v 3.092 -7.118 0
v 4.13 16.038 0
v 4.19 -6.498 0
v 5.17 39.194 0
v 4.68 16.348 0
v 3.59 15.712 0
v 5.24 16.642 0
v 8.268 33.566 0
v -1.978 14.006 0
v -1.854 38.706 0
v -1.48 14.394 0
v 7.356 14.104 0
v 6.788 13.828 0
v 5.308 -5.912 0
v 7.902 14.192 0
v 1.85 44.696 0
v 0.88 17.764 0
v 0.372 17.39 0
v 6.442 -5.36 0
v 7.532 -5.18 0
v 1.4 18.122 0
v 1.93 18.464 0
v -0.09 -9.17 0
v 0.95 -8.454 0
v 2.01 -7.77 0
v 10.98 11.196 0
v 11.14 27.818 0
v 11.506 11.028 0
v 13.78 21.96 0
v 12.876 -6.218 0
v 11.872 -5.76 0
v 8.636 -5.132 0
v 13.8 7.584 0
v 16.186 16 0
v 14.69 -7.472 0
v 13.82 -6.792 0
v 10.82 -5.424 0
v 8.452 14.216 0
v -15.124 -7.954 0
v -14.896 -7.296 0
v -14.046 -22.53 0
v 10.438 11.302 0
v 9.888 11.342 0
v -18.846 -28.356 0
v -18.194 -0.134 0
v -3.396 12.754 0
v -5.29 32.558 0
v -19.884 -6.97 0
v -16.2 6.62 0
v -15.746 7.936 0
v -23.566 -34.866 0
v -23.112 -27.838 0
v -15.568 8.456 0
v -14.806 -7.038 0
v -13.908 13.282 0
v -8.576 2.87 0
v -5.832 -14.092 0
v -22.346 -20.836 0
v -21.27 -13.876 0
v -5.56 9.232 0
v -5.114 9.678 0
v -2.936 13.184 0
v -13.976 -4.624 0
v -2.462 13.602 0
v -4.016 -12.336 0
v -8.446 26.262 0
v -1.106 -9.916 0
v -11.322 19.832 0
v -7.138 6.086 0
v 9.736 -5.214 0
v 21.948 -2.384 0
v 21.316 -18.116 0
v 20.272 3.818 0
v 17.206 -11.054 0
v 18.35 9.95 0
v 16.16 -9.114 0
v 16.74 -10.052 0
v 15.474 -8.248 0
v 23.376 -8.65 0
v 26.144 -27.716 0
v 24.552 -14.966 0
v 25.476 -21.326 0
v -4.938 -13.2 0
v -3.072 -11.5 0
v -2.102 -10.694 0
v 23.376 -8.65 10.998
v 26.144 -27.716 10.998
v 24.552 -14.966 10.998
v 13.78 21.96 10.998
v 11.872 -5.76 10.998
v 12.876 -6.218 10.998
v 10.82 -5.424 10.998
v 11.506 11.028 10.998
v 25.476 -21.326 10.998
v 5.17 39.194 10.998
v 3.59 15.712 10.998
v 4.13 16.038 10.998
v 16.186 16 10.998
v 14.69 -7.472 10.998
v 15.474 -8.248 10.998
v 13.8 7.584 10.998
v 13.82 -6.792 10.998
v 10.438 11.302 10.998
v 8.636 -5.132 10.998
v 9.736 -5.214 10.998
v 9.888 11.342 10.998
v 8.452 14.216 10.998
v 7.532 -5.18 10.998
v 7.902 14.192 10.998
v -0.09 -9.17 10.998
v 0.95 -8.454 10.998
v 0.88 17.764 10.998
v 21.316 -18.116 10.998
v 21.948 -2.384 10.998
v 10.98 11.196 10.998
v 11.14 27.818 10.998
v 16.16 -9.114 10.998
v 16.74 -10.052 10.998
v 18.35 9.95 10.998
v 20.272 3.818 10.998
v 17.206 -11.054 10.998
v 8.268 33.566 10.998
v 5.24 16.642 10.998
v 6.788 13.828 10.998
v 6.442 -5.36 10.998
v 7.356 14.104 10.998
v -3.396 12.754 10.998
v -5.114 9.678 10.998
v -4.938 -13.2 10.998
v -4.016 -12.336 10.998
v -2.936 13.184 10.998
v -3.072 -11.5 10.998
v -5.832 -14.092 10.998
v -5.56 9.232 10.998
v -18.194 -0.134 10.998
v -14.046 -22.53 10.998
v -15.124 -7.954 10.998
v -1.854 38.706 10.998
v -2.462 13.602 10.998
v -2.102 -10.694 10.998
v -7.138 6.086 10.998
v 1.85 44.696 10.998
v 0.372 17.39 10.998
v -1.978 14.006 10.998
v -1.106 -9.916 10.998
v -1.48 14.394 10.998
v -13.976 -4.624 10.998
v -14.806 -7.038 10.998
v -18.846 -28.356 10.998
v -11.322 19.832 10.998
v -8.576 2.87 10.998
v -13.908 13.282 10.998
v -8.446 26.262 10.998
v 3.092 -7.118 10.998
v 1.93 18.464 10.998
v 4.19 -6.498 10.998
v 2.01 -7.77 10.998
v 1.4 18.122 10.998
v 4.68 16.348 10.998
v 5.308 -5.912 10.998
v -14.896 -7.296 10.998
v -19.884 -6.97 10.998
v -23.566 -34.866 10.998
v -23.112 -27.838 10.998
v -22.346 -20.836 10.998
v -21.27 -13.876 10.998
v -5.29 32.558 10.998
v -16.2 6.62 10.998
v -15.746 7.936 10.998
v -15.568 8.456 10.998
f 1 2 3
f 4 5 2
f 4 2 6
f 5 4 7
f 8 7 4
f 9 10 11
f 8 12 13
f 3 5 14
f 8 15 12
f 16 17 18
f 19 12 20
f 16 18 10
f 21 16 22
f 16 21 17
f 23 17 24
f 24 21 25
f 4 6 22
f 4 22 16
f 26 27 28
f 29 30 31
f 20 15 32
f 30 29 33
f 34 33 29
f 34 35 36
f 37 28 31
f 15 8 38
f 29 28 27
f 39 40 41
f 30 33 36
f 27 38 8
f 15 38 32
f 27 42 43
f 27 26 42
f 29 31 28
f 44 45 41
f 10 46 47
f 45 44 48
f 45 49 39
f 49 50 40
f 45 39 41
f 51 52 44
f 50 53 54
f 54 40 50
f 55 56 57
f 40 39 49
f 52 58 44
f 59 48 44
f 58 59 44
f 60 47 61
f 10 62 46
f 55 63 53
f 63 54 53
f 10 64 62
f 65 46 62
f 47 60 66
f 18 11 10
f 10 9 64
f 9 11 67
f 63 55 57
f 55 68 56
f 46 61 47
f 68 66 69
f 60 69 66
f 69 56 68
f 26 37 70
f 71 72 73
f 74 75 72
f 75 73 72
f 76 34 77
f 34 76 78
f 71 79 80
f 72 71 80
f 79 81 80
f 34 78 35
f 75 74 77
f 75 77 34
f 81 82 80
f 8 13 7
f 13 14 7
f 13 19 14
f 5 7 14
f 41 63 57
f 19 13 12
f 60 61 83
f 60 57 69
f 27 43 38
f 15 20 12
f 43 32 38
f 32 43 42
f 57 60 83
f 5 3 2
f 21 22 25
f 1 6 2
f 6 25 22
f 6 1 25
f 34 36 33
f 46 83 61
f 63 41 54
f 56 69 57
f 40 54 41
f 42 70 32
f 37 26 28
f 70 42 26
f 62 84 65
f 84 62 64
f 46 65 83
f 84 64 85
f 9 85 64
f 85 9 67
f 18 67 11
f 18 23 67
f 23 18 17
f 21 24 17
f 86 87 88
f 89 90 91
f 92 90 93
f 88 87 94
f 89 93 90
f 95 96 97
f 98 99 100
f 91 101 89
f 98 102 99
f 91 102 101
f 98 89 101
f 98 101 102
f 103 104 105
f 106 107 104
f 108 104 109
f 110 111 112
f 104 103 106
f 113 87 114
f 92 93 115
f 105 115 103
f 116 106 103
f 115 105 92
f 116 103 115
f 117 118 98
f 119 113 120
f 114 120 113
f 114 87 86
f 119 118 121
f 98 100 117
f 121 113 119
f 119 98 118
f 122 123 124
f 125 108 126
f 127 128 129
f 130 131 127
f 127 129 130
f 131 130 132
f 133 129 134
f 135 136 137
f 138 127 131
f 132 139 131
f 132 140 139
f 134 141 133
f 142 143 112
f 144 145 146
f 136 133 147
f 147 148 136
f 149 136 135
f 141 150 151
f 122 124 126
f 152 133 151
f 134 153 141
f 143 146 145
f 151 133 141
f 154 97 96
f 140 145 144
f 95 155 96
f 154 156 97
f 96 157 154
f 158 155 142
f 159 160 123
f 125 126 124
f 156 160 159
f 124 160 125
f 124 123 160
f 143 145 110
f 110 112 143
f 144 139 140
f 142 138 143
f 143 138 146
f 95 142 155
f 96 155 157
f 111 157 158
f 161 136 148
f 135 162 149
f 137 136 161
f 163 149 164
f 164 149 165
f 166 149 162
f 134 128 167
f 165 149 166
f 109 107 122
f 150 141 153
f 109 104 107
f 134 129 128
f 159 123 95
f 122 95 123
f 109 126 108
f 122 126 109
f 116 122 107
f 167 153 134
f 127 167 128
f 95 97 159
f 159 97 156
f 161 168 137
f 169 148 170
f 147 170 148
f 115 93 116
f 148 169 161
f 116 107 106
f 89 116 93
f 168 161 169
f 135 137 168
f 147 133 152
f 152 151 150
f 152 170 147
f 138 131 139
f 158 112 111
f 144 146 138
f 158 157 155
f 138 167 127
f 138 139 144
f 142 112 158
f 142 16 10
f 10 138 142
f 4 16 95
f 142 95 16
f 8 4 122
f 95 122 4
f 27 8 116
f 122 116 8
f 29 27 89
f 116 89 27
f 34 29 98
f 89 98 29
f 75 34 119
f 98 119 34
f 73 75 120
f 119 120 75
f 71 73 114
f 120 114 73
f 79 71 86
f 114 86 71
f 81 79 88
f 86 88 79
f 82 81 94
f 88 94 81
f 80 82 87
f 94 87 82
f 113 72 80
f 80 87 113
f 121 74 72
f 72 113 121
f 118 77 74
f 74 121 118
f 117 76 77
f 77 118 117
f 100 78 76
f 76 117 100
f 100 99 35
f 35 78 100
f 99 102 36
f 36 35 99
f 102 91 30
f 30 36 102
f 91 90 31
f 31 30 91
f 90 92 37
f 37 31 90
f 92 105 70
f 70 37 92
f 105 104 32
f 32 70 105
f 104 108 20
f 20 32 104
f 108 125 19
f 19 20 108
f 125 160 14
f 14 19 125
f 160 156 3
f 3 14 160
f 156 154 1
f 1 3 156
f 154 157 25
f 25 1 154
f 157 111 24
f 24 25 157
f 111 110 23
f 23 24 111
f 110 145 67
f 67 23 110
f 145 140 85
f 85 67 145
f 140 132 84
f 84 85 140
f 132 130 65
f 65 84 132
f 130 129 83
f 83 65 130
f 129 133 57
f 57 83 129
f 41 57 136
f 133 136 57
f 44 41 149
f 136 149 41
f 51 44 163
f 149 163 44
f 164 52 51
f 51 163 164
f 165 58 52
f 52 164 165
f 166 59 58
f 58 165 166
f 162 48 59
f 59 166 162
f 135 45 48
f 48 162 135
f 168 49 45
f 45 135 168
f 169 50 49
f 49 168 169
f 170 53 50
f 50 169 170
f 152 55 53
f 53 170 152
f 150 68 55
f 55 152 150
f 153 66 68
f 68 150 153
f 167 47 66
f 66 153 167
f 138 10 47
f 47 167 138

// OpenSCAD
//
//    Usage:
//
//        To reference this file in another OpenSCAD file
//            use <star-trek-logo.scad>;

/////////////////////
// MODULE Star_Trek_Logo_Blank_fixed
/////////////////////

// Examples/Tests
Star_Trek_Logo_Blank_fixed();

// Functions and Utilities
function Star_Trek_Logo_Blank_fixed_dimX() = 49.71;
function Star_Trek_Logo_Blank_fixed_dimY() = 79.56;
function Star_Trek_Logo_Blank_fixed_dimZ() = 11.00;
function Star_Trek_Logo_Blank_fixed_multmatrix() = [[1.000000,0.000000,0.000000,0.000000],[0.000000,1.000000,0.000000,0.000000],[0.000000,0.000000,1.000000,0.000000],[0.000000,0.000000,0.000000,1.000000]];

/////////////////////
// geometry for Star_Trek_Logo_Blank_fixed
function Star_Trek_Logo_Blank_fixed_faces() = [
[2,1,0],[1,4,3],[5,1,3],[6,3,4],[3,6,7],[10,9,8],[12,11,7],[13,4,2],[11,14,7],[17,16,15],[19,11,18],[9,17,15],[21,15,20],[16,20,15],[23,16,22],[24,20,23],[21,5,3],[15,21,3],[27,26,25],[30,29,28],[31,14,19],[32,28,29],[28,32,33],[35,34,33],[30,27,36],[37,7,14],[26,27,28],[40,39,38],[35,32,29],[7,37,26],[31,37,14],[42,41,26],[41,25,26],[27,30,28],[40,44,43],[46,45,9],[47,43,44],[38,48,44],[39,49,48],[40,38,44],[43,51,50],[53,52,49],[49,39,53],[56,55,54],[48,38,39],[43,57,51],[43,47,58],[43,58,57],[60,46,59],[45,61,9],[52,62,54],[52,53,62],[61,63,9],[61,45,64],[65,59,46],[9,10,17],[63,8,9],[66,10,8],[56,54,62],[55,67,54],[46,60,45],[68,65,67],[65,68,59],[67,55,68],[69,36,25],[72,71,70],[71,74,73],[71,72,74],[76,33,75],[77,75,33],[79,78,70],[79,70,71],[79,80,78],[34,77,33],[76,73,74],[33,76,74],[79,81,80],[6,12,7],[6,13,12],[13,18,12],[13,6,4],[56,62,40],[11,12,18],[82,60,59],[68,56,59],[37,42,26],[11,19,14],[37,31,42],[41,42,31],[82,59,56],[1,2,4],[24,21,20],[1,5,0],[21,24,5],[24,0,5],[32,35,33],[60,82,45],[53,40,62],[56,68,55],[40,53,39],[31,69,41],[27,25,36],[25,41,69],[64,83,61],[63,61,83],[82,64,45],[84,63,83],[63,84,8],[66,8,84],[10,66,17],[66,22,17],[16,17,22],[16,23,20],[87,86,85],[90,89,88],[92,89,91],[93,86,87],[89,92,88],[96,95,94],[99,98,97],[88,100,90],[98,101,97],[100,101,90],[100,88,97],[101,100,97],[104,103,102],[103,106,105],[108,103,107],[111,110,109],[105,102,103],[113,86,112],[114,92,91],[102,114,104],[102,105,115],[91,104,114],[114,102,115],[97,117,116],[119,112,118],[112,119,113],[85,86,113],[120,117,118],[116,99,97],[118,112,120],[117,97,118],[123,122,121],[125,107,124],[128,127,126],[126,130,129],[129,128,126],[131,129,130],[133,128,132],[136,135,134],[130,126,137],[130,138,131],[138,139,131],[132,140,133],[111,142,141],[145,144,143],[146,132,135],[135,147,146],[134,135,148],[150,149,140],[125,123,121],[150,132,151],[140,152,133],[144,145,142],[140,132,150],[95,96,153],[143,144,139],[95,154,94],[96,155,153],[153,156,95],[141,154,157],[122,159,158],[123,125,124],[158,159,155],[124,159,123],[159,122,123],[109,144,142],[142,111,109],[139,138,143],[142,137,141],[145,137,142],[154,141,94],[156,154,95],[157,156,110],[147,135,160],[148,161,134],[160,135,136],[163,148,162],[164,148,163],[161,148,165],[166,127,133],[165,148,164],[121,106,108],[152,140,149],[106,103,108],[127,128,133],[94,122,158],[122,94,121],[107,125,108],[108,125,121],[106,121,115],[133,152,166],[127,166,126],[158,96,94],[155,96,158],[136,167,160],[169,147,168],[147,169,146],[115,92,114],[160,168,147],[105,106,115],[92,115,88],[168,160,167],[167,136,134],[151,132,146],[149,150,151],[146,169,151],[138,130,137],[110,111,157],[137,145,143],[154,156,157],[126,166,137],[143,138,137],[157,111,141],[9,15,141],[141,137,9],[94,15,3],[15,94,141],[121,3,7],[3,121,94],[115,7,26],[7,115,121],[88,26,28],[26,88,115],[97,28,33],[28,97,88],[118,33,74],[33,118,97],[119,74,72],[74,119,118],[113,72,70],[72,113,119],[85,70,78],[70,85,113],[87,78,80],[78,87,85],[93,80,81],[80,93,87],[86,81,79],[81,86,93],[79,71,112],[112,86,79],[71,73,120],[120,112,71],[73,76,117],[117,120,73],[76,75,116],[116,117,76],[75,77,99],[99,116,75],[34,98,99],[99,77,34],[35,101,98],[98,34,35],[29,90,101],[101,35,29],[30,89,90],[90,29,30],[36,91,89],[89,30,36],[69,104,91],[91,36,69],[31,103,104],[104,69,31],[19,107,103],[103,31,19],[18,124,107],[107,19,18],[13,159,124],[124,18,13],[2,155,159],[159,13,2],[0,153,155],[155,2,0],[24,156,153],[153,0,24],[23,110,156],[156,24,23],[22,109,110],[110,23,22],[66,144,109],[109,22,66],[84,139,144],[144,66,84],[83,131,139],[139,84,83],[64,129,131],[131,83,64],[82,128,129],[129,64,82],[56,132,128],[128,82,56],[135,56,40],[56,135,132],[148,40,43],[40,148,135],[162,43,50],[43,162,148],[50,51,163],[163,162,50],[51,57,164],[164,163,51],[57,58,165],[165,164,57],[58,47,161],[161,165,58],[47,44,134],[134,161,47],[44,48,167],[167,134,44],[48,49,168],[168,167,48],[49,52,169],[169,168,49],[52,54,151],[151,169,52],[54,67,149],[149,151,54],[67,65,152],[152,149,67],[65,46,166],[166,152,65],[46,9,137],[137,166,46]];
function Star_Trek_Logo_Blank_fixed_points() = [
[73.092003,82.882004,0.000000],[74.130005,106.038002,0.000000],[74.190002,83.502007,0.000000],[75.170006,129.194000,0.000000],[74.680000,106.348007,0.000000],[73.590004,105.712006,0.000000],[75.240005,106.642006,0.000000],[78.268005,123.566010,0.000000],[68.022003,104.006004,0.000000],[68.146004,128.706009,0.000000],[68.520004,104.394005,0.000000],[77.356003,104.104004,0.000000],[76.788002,103.828003,0.000000],[75.308006,84.088005,0.000000],[77.902000,104.192001,0.000000],[71.850006,134.695999,0.000000],[70.880005,107.764008,0.000000],[70.372002,107.390007,0.000000],[76.442001,84.640007,0.000000],[77.532005,84.820007,0.000000],[71.400002,108.122002,0.000000],[71.930000,108.464005,0.000000],[69.910004,80.830002,0.000000],[70.950005,81.546005,0.000000],[72.010002,82.230003,0.000000],[80.980003,101.196007,0.000000],[81.140007,117.818008,0.000000],[81.506004,101.028008,0.000000],[83.780006,111.960007,0.000000],[82.876007,83.782005,0.000000],[81.872002,84.240005,0.000000],[78.636002,84.868004,0.000000],[83.800003,97.584007,0.000000],[86.186005,106.000008,0.000000],[84.690002,82.528008,0.000000],[83.820007,83.208000,0.000000],[80.820007,84.576004,0.000000],[78.452003,104.216003,0.000000],[54.876003,82.046005,0.000000],[55.104004,82.704002,0.000000],[55.954002,67.470001,0.000000],[80.438004,101.302002,0.000000],[79.888000,101.342003,0.000000],[51.154003,61.644005,0.000000],[51.806004,89.866005,0.000000],[66.604004,102.754005,0.000000],[64.710007,122.558006,0.000000],[50.116001,83.030006,0.000000],[53.800003,96.620003,0.000000],[54.254002,97.936005,0.000000],[46.434002,55.134003,0.000000],[46.888000,62.162003,0.000000],[54.432003,98.456001,0.000000],[55.194004,82.962006,0.000000],[56.092003,103.282005,0.000000],[61.424004,92.870003,0.000000],[64.167999,75.908005,0.000000],[47.654003,69.164001,0.000000],[48.730003,76.124001,0.000000],[64.440002,99.232002,0.000000],[64.886002,99.678001,0.000000],[67.064003,103.184006,0.000000],[56.024002,85.376007,0.000000],[67.538002,103.602005,0.000000],[65.984001,77.664001,0.000000],[61.554005,116.262009,0.000000],[68.894005,80.084007,0.000000],[58.678001,109.832008,0.000000],[62.862003,96.086006,0.000000],[79.736000,84.786003,0.000000],[91.948006,87.616005,0.000000],[91.316002,71.884003,0.000000],[90.272003,93.818001,0.000000],[87.206001,78.946007,0.000000],[88.350006,99.950005,0.000000],[86.160004,80.886002,0.000000],[86.740005,79.948006,0.000000],[85.474007,81.752007,0.000000],[93.376007,81.350006,0.000000],[96.144005,62.284004,0.000000],[94.552002,75.034004,0.000000],[95.476006,68.674004,0.000000],[65.062004,76.800003,0.000000],[66.928001,78.500000,0.000000],[67.898003,79.306007,0.000000],[93.376007,81.350006,10.998000],[96.144005,62.284004,10.998000],[94.552002,75.034004,10.998000],[83.780006,111.960007,10.998000],[81.872002,84.240005,10.998000],[82.876007,83.782005,10.998000],[80.820007,84.576004,10.998000],[81.506004,101.028008,10.998000],[95.476006,68.674004,10.998000],[75.170006,129.194000,10.998000],[73.590004,105.712006,10.998000],[74.130005,106.038002,10.998000],[86.186005,106.000008,10.998000],[84.690002,82.528008,10.998000],[85.474007,81.752007,10.998000],[83.800003,97.584007,10.998000],[83.820007,83.208000,10.998000],[80.438004,101.302002,10.998000],[78.636002,84.868004,10.998000],[79.736000,84.786003,10.998000],[79.888000,101.342003,10.998000],[78.452003,104.216003,10.998000],[77.532005,84.820007,10.998000],[77.902000,104.192001,10.998000],[69.910004,80.830002,10.998000],[70.950005,81.546005,10.998000],[70.880005,107.764008,10.998000],[91.316002,71.884003,10.998000],[91.948006,87.616005,10.998000],[80.980003,101.196007,10.998000],[81.140007,117.818008,10.998000],[86.160004,80.886002,10.998000],[86.740005,79.948006,10.998000],[88.350006,99.950005,10.998000],[90.272003,93.818001,10.998000],[87.206001,78.946007,10.998000],[78.268005,123.566010,10.998000],[75.240005,106.642006,10.998000],[76.788002,103.828003,10.998000],[76.442001,84.640007,10.998000],[77.356003,104.104004,10.998000],[66.604004,102.754005,10.998000],[64.886002,99.678001,10.998000],[65.062004,76.800003,10.998000],[65.984001,77.664001,10.998000],[67.064003,103.184006,10.998000],[66.928001,78.500000,10.998000],[64.167999,75.908005,10.998000],[64.440002,99.232002,10.998000],[51.806004,89.866005,10.998000],[55.954002,67.470001,10.998000],[54.876003,82.046005,10.998000],[68.146004,128.706009,10.998000],[67.538002,103.602005,10.998000],[67.898003,79.306007,10.998000],[62.862003,96.086006,10.998000],[71.850006,134.695999,10.998000],[70.372002,107.390007,10.998000],[68.022003,104.006004,10.998000],[68.894005,80.084007,10.998000],[68.520004,104.394005,10.998000],[56.024002,85.376007,10.998000],[55.194004,82.962006,10.998000],[51.154003,61.644005,10.998000],[58.678001,109.832008,10.998000],[61.424004,92.870003,10.998000],[56.092003,103.282005,10.998000],[61.554005,116.262009,10.998000],[73.092003,82.882004,10.998000],[71.930000,108.464005,10.998000],[74.190002,83.502007,10.998000],[72.010002,82.230003,10.998000],[71.400002,108.122002,10.998000],[74.680000,106.348007,10.998000],[75.308006,84.088005,10.998000],[55.104004,82.704002,10.998000],[50.116001,83.030006,10.998000],[46.434002,55.134003,10.998000],[46.888000,62.162003,10.998000],[47.654003,69.164001,10.998000],[48.730003,76.124001,10.998000],[64.710007,122.558006,10.998000],[53.800003,96.620003,10.998000],[54.254002,97.936005,10.998000],[54.432003,98.456001,10.998000]];

module Star_Trek_Logo_Blank_fixed() 
{
	translate([-70, -90, 0])
    multmatrix(Star_Trek_Logo_Blank_fixed_multmatrix()) 
	polyhedron(faces = Star_Trek_Logo_Blank_fixed_faces(), points = Star_Trek_Logo_Blank_fixed_points(), convexity=10);
};
